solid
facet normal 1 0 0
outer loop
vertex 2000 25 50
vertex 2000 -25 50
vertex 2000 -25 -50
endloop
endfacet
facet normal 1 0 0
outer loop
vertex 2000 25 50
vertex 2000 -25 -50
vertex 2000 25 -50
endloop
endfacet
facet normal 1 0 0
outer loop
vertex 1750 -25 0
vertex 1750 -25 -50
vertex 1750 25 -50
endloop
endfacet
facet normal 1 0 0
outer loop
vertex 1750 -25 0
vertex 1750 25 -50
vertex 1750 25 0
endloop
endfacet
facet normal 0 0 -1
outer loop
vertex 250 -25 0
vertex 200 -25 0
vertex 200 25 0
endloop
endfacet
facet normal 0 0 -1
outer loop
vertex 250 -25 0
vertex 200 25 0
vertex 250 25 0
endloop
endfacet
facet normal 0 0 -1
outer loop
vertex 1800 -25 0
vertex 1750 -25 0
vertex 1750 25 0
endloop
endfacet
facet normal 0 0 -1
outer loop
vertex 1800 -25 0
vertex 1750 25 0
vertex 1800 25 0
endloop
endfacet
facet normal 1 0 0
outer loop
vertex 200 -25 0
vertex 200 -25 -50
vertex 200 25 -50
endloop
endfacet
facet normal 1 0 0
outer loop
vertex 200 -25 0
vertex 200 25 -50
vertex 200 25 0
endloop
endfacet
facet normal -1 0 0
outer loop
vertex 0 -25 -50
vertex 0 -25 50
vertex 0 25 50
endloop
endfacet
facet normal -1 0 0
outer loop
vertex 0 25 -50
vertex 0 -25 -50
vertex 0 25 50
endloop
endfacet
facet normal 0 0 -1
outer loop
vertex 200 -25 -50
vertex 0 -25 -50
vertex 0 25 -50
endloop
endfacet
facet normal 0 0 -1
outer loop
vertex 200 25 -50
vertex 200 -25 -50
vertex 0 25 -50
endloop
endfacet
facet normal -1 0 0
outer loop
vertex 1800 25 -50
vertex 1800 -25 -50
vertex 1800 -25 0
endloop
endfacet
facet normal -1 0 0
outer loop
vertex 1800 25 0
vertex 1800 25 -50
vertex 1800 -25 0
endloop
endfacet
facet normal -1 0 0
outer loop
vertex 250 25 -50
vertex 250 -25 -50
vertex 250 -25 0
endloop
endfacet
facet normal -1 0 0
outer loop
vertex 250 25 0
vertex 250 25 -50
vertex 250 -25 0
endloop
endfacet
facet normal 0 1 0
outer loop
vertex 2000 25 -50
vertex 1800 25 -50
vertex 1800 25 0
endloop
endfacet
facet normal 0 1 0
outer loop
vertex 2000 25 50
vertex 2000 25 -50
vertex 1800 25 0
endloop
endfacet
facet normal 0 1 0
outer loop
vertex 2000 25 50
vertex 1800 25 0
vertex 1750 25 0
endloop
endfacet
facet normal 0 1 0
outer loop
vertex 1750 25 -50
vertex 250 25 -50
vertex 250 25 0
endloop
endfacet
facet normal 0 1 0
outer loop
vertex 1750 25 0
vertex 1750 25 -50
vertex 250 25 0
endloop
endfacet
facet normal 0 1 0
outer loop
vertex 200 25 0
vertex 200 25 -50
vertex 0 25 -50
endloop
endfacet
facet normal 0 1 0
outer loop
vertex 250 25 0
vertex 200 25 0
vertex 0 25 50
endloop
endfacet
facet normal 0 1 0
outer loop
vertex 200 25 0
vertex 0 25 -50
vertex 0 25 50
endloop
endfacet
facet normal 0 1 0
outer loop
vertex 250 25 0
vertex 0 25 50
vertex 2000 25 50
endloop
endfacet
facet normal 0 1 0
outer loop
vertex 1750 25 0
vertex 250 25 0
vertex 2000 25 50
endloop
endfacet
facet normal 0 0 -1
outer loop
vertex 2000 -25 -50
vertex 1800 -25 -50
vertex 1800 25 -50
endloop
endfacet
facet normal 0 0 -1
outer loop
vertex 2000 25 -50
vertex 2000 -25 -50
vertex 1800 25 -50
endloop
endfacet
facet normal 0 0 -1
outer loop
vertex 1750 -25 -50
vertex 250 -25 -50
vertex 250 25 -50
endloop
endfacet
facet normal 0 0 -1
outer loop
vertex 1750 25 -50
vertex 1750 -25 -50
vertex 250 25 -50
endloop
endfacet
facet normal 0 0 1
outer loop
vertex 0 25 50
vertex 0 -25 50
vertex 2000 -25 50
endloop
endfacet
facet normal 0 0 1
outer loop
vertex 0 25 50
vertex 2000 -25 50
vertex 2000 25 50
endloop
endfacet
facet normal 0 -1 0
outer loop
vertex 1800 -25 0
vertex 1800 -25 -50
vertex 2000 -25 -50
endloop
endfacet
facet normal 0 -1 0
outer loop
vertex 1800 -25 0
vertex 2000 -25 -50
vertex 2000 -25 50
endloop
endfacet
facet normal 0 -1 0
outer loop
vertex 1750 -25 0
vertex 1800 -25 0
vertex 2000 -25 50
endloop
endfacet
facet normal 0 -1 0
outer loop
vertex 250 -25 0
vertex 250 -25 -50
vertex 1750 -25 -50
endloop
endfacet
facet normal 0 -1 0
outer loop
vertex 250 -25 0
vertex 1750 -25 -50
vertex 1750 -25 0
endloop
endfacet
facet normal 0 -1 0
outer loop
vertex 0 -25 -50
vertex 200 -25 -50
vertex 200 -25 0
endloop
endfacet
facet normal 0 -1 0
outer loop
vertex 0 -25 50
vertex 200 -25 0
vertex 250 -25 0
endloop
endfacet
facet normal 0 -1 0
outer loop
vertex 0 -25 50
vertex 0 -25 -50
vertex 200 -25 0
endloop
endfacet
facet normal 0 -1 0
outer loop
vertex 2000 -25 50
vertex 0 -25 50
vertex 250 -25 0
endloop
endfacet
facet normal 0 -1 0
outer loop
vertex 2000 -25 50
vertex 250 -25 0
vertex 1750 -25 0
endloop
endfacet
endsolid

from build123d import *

# Parameters (mm, degrees)
F0_W     = 50
F0_H     = 100
F1_DEPTH = 2000
F3_ANGLE = -90
F8_W     = 50
F8_H     = 50
F9_DEPTH = 50.001


with BuildPart() as f1:
    # F0 (on Right) → F1 (new body)
    with BuildSketch(Plane.YZ):
        Rectangle(F0_W, F0_H)
    extrude(amount=F1_DEPTH)

    # F8 (on face) → F9 (cut, through all)
    with BuildSketch(Plane.XZ.offset(25)):
        with Locations((225, -25)):
            Rectangle(F8_W, F8_H)
        with Locations((1775, -25)):
            Rectangle(F8_W, F8_H)
    extrude(amount=-F9_DEPTH, mode=Mode.SUBTRACT)


with BuildPart() as f2_1:
    # F2: copy of F1
    add(f1.part.moved(Location((0, 2000, 0))))


with BuildPart() as f3_1:
    # F3: copy of F1
    add(f1.part.rotate(Axis((0, -25, 0), (0, 0, 1)), F3_ANGLE))


with BuildPart() as f5_1:
    # F5: copy of F1
    add(f1.part)


solid = f1.part
